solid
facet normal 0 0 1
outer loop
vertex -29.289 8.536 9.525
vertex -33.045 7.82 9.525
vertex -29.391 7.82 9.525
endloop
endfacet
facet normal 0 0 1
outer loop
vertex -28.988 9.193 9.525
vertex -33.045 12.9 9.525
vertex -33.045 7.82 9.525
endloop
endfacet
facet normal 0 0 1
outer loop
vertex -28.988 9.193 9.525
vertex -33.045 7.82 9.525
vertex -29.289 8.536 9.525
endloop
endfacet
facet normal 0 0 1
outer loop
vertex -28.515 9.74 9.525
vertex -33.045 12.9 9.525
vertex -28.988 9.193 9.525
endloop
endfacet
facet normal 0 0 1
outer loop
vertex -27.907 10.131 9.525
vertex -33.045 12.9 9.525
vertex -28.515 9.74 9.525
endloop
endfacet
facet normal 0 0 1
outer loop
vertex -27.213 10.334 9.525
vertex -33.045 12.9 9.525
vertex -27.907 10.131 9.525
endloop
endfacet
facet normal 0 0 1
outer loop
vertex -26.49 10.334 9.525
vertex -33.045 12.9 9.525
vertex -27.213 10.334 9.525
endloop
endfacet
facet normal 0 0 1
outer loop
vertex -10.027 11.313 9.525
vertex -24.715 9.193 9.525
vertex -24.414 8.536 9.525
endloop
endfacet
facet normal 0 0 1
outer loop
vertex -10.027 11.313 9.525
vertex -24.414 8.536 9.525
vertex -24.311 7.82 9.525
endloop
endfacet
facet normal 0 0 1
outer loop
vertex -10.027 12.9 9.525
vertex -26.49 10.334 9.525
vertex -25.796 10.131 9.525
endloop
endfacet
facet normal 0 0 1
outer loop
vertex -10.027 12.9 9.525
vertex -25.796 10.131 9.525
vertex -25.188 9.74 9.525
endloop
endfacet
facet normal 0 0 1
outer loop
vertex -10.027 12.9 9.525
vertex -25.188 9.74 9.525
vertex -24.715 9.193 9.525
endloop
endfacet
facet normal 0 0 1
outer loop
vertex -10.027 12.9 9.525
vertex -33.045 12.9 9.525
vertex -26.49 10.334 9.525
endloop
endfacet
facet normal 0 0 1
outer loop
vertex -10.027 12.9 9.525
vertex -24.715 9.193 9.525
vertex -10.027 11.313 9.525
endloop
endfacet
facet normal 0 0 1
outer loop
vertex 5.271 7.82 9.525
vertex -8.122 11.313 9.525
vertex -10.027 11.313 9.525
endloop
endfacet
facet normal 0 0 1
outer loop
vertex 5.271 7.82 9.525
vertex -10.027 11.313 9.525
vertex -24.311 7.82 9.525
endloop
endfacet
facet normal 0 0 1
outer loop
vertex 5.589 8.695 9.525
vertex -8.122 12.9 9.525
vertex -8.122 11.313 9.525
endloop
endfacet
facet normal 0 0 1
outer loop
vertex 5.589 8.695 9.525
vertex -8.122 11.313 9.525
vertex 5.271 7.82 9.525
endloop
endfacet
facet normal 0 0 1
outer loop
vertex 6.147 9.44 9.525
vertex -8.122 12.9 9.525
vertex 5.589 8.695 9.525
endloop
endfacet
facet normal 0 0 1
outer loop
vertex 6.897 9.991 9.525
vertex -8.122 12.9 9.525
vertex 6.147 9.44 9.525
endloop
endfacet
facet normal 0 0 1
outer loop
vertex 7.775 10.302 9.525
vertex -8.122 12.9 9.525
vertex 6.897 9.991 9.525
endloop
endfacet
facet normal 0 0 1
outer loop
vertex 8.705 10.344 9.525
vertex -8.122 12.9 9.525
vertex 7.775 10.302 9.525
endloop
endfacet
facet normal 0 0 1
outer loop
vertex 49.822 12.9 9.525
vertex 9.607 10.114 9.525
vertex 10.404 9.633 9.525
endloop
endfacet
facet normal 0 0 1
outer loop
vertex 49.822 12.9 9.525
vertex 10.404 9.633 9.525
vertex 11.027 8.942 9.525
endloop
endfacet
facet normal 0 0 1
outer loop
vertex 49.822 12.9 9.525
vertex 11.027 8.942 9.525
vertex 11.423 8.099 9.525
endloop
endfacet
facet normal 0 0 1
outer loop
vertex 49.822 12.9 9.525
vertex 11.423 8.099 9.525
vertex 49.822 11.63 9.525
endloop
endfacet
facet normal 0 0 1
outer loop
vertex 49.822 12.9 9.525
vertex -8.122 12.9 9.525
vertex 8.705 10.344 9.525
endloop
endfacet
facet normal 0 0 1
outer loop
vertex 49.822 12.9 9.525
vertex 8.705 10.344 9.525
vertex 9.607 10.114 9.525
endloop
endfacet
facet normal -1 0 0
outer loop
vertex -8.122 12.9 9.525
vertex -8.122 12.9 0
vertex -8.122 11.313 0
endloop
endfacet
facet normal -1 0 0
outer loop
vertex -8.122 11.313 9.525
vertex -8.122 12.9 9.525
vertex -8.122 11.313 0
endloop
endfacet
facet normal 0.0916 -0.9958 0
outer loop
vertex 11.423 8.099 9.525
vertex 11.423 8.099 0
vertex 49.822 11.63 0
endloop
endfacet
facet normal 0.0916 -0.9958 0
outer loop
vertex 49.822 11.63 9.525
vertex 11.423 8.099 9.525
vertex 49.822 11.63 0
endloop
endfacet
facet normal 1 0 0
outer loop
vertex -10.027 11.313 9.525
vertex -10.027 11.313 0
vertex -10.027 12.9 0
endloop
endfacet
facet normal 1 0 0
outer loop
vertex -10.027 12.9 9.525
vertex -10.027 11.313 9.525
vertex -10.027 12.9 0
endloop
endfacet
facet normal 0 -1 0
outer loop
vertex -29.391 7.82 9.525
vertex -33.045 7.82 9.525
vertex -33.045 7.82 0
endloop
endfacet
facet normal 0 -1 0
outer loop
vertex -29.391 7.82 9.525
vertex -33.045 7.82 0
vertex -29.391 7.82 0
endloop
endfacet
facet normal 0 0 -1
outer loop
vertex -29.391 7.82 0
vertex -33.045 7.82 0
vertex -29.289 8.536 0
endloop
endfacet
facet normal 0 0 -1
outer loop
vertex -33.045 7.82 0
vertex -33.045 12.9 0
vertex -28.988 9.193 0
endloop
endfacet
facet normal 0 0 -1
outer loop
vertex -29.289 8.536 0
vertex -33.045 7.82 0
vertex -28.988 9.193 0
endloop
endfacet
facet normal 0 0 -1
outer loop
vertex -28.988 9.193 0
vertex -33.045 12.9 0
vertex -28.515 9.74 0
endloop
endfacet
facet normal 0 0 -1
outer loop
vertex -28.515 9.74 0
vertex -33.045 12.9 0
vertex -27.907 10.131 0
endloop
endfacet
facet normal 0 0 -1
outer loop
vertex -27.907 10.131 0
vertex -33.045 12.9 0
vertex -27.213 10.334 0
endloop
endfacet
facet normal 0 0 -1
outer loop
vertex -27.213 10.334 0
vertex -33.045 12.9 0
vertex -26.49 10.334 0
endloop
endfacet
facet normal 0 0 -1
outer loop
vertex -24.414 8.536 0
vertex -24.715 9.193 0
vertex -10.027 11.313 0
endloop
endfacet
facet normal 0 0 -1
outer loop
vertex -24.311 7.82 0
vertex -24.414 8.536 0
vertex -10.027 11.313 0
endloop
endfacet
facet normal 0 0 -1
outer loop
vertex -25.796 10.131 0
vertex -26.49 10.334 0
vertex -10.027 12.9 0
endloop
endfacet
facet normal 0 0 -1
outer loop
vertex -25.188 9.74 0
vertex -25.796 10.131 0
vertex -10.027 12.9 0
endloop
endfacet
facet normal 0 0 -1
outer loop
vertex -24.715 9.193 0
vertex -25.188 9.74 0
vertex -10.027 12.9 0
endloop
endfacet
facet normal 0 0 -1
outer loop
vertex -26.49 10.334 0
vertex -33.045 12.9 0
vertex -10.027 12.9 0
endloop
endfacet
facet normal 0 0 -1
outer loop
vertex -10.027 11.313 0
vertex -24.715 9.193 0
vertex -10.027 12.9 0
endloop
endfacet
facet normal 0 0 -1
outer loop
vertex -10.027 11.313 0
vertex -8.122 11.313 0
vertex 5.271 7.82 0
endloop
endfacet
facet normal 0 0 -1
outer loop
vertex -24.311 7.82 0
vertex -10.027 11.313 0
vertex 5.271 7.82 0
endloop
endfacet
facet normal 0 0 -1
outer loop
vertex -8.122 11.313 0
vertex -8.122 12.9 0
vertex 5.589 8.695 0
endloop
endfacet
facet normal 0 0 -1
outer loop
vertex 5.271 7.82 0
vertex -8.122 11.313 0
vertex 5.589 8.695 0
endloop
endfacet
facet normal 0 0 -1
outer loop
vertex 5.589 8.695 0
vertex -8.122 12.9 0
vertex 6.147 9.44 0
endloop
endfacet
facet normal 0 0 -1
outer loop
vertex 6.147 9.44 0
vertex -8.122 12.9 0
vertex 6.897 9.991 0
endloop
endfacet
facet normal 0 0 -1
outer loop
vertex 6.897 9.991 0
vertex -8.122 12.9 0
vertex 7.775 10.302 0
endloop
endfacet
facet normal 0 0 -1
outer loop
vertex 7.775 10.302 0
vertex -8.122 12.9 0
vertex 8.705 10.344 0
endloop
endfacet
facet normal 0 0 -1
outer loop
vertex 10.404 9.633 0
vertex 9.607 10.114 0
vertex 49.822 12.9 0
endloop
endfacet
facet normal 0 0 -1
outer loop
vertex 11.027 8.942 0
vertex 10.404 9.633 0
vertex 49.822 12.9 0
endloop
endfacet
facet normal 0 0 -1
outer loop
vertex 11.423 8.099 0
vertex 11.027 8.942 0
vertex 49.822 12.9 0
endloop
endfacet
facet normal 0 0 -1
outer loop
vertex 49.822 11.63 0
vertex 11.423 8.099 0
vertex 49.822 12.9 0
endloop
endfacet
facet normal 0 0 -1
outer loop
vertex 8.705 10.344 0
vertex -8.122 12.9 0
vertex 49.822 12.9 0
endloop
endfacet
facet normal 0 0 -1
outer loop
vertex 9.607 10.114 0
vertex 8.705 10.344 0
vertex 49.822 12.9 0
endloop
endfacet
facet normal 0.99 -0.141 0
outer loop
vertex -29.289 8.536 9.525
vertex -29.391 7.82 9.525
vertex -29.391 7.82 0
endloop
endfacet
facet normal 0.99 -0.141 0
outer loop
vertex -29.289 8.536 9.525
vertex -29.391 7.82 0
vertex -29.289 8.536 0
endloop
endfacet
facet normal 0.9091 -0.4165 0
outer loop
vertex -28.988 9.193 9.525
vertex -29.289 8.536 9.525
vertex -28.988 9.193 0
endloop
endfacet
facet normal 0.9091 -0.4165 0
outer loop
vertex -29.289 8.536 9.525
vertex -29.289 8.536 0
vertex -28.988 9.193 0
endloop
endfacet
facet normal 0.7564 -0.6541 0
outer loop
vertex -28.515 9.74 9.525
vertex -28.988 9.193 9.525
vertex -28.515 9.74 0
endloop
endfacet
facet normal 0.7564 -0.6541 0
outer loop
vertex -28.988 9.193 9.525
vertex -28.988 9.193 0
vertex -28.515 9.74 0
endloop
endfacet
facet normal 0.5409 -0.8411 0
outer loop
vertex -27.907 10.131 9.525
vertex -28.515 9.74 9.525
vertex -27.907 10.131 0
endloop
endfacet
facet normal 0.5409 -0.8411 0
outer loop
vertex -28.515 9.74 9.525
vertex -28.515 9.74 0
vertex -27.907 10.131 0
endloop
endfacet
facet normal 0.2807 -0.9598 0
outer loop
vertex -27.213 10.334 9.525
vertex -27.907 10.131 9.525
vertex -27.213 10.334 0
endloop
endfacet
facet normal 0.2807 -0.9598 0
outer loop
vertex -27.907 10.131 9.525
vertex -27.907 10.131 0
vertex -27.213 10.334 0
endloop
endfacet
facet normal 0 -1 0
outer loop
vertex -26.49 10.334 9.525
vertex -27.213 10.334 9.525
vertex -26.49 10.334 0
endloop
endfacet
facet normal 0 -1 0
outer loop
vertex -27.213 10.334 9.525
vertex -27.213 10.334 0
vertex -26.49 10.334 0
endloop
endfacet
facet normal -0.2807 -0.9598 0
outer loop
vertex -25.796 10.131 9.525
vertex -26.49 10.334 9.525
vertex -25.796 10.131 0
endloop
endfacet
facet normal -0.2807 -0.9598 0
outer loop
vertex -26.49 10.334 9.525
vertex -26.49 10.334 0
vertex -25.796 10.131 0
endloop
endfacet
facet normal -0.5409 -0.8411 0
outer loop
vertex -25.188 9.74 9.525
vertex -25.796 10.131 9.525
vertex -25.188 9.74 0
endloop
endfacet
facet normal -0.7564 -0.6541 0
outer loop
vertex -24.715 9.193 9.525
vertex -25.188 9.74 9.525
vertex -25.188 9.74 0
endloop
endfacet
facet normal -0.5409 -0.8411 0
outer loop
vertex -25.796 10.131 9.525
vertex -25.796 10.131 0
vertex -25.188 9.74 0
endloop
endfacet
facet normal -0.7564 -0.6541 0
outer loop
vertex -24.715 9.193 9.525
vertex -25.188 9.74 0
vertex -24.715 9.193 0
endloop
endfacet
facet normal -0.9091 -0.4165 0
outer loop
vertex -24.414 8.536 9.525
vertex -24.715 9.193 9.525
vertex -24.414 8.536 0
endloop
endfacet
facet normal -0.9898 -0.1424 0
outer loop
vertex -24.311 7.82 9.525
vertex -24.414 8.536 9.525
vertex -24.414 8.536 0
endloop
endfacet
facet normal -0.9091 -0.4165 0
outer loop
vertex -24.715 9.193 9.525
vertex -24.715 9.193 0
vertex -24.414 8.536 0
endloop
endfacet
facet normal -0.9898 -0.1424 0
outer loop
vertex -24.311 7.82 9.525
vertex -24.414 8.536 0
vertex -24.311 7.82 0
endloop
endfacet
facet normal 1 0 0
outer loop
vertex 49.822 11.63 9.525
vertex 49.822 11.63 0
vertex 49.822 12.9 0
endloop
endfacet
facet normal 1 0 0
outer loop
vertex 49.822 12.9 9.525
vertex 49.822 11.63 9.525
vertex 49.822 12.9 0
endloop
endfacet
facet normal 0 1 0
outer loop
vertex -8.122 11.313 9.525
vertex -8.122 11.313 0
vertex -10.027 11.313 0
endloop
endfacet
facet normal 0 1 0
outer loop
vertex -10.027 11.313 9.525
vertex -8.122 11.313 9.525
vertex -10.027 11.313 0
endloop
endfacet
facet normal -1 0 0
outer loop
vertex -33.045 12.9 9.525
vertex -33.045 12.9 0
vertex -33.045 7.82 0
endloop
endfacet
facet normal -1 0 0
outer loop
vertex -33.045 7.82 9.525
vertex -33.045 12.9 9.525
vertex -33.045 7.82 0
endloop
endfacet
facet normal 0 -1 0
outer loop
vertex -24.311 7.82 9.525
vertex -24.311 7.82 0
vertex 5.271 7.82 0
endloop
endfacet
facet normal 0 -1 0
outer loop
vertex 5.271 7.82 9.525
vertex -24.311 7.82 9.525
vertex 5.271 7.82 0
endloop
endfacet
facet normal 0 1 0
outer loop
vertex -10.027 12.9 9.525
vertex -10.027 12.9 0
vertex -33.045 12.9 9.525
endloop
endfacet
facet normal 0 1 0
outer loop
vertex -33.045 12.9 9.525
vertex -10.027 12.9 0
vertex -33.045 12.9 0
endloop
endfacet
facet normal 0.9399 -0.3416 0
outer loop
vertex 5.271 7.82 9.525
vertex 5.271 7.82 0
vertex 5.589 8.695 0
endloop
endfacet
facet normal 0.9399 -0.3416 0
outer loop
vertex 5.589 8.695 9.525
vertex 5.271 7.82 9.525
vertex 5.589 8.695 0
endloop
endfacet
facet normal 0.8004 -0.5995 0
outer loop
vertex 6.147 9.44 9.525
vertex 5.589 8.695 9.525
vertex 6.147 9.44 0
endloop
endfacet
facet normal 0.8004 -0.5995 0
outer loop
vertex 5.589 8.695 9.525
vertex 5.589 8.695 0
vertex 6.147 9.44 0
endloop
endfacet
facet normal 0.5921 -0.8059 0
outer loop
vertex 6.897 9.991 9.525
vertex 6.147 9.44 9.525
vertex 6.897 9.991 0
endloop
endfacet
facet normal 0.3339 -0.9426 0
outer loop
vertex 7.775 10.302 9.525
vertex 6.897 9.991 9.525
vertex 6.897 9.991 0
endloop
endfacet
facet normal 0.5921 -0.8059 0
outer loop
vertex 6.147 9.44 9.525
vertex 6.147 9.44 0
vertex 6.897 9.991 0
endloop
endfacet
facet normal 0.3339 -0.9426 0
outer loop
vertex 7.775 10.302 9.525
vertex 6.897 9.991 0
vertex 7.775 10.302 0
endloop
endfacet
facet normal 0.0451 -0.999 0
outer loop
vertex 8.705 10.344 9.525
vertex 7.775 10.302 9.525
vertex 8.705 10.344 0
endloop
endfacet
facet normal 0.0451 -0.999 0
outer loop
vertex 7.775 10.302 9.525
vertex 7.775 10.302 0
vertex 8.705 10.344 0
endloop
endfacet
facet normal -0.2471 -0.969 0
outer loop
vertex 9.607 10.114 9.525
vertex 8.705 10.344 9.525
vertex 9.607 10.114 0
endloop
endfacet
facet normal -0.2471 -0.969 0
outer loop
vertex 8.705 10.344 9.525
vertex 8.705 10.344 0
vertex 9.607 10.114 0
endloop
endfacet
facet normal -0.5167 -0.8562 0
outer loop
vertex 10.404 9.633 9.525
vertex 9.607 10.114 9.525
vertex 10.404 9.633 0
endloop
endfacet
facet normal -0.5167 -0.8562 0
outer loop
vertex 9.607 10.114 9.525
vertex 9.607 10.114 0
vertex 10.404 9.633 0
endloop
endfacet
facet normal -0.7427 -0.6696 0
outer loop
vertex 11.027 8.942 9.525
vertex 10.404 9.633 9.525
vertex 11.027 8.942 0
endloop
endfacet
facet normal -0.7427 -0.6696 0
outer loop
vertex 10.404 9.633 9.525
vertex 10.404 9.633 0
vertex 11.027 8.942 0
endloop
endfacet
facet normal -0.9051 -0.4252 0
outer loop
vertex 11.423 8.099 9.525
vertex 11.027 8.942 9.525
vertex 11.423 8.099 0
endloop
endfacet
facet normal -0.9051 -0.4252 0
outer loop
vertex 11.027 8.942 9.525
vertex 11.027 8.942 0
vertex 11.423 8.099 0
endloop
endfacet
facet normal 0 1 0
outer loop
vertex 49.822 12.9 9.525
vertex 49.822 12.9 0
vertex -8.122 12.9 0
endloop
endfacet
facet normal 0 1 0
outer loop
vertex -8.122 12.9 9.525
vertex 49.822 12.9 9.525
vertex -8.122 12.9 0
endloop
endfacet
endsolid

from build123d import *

# Parameters (mm, degrees)
F1_DEPTH = 9.525


with BuildPart() as f1:
    # F0 (on Top) → F1 (new body)
    with BuildSketch(Plane.XY):
        with BuildLine():
            Line((-10.026586, 12.900152), (-33.045336, 12.900152))
            Line((-33.045336, 12.900152), (-33.045336, 7.820152))
            Line((-33.045336, 7.820152), (-29.39147, 7.820152))
            ThreePointArc((-29.39147, 7.820152), (-26.85147, 10.360152), (-24.31147, 7.820152))
            Line((-24.31147, 7.820152), (5.271212, 7.820152))
            ThreePointArc((5.271212, 7.820152), (8.238203, 10.356891), (11.422657, 8.099163))
            Line((11.422657, 8.099163), (49.822164, 11.630152))
            Line((49.822164, 11.630152), (49.822164, 12.900152))
            Line((49.822164, 12.900152), (-8.121586, 12.900152))
            Line((-8.121586, 12.900152), (-8.121586, 11.312652))
            Line((-8.121586, 11.312652), (-10.026586, 11.312652))
            Line((-10.026586, 11.312652), (-10.026586, 12.900152))
        make_face()
    extrude(amount=F1_DEPTH)


solid = f1.part
